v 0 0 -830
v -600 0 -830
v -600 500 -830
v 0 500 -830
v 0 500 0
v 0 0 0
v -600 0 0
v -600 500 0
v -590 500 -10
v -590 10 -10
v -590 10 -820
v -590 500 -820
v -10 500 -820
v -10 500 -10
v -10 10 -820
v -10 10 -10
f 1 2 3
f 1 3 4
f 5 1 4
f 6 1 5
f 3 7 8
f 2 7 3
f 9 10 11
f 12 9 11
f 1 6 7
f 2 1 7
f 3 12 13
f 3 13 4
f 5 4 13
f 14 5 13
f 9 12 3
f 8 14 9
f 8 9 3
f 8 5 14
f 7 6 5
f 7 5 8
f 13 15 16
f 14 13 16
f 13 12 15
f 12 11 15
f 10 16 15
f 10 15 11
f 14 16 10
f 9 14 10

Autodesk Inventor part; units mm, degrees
ref_plane "YZ Plane" through (0, 0, 0) normal (1, 0, 0) x (0, 1, 0)
ref_plane "XZ Plane" through (0, 0, 0) normal (0, 1, 0) x (-1, 0, 0)
ref_plane "XY Plane" through (0, 0, 0) normal (0, 0, 1) x (1, 0, 0)
sketch "Sketch1" plane through (0, 0, 0) normal (0, 1, 0) x (-1, 0, 0)
  line L0 (0, 0) -> (600, 0)
  line L1 (600, 0) -> (600, -830)
  line L2 (600, -830) -> (0, -830)
  line L3 (0, -830) -> (0, 0)
  dimension "d0" = 600
  dimension "d1" = 830
extrude "Extrusion1" add sketch "Sketch1" along normal blind 500
shell "Shell1" thickness 10 removed faces 1 at (-200, 500, -276.6667)
equation "\"BendRadius\" = Thickness"
equation "\"BendReliefWidth\" = Thickness"
equation "\"BendReliefDepth\" = 0.5 * Thickness"
equation "\"CornerReliefSize\" = 4 * Thickness"
equation "\"MinimumRemnant\" = 2 * Thickness"
equation "\"TransitionRadius\" = BendRadius"
equation "\"JacobiRadiusSize\" = BendRadius"
equation "\"GapSize\" = Thickness"
equation "\"Thickness\" = 0.5"
properties part number "Paste Container"
